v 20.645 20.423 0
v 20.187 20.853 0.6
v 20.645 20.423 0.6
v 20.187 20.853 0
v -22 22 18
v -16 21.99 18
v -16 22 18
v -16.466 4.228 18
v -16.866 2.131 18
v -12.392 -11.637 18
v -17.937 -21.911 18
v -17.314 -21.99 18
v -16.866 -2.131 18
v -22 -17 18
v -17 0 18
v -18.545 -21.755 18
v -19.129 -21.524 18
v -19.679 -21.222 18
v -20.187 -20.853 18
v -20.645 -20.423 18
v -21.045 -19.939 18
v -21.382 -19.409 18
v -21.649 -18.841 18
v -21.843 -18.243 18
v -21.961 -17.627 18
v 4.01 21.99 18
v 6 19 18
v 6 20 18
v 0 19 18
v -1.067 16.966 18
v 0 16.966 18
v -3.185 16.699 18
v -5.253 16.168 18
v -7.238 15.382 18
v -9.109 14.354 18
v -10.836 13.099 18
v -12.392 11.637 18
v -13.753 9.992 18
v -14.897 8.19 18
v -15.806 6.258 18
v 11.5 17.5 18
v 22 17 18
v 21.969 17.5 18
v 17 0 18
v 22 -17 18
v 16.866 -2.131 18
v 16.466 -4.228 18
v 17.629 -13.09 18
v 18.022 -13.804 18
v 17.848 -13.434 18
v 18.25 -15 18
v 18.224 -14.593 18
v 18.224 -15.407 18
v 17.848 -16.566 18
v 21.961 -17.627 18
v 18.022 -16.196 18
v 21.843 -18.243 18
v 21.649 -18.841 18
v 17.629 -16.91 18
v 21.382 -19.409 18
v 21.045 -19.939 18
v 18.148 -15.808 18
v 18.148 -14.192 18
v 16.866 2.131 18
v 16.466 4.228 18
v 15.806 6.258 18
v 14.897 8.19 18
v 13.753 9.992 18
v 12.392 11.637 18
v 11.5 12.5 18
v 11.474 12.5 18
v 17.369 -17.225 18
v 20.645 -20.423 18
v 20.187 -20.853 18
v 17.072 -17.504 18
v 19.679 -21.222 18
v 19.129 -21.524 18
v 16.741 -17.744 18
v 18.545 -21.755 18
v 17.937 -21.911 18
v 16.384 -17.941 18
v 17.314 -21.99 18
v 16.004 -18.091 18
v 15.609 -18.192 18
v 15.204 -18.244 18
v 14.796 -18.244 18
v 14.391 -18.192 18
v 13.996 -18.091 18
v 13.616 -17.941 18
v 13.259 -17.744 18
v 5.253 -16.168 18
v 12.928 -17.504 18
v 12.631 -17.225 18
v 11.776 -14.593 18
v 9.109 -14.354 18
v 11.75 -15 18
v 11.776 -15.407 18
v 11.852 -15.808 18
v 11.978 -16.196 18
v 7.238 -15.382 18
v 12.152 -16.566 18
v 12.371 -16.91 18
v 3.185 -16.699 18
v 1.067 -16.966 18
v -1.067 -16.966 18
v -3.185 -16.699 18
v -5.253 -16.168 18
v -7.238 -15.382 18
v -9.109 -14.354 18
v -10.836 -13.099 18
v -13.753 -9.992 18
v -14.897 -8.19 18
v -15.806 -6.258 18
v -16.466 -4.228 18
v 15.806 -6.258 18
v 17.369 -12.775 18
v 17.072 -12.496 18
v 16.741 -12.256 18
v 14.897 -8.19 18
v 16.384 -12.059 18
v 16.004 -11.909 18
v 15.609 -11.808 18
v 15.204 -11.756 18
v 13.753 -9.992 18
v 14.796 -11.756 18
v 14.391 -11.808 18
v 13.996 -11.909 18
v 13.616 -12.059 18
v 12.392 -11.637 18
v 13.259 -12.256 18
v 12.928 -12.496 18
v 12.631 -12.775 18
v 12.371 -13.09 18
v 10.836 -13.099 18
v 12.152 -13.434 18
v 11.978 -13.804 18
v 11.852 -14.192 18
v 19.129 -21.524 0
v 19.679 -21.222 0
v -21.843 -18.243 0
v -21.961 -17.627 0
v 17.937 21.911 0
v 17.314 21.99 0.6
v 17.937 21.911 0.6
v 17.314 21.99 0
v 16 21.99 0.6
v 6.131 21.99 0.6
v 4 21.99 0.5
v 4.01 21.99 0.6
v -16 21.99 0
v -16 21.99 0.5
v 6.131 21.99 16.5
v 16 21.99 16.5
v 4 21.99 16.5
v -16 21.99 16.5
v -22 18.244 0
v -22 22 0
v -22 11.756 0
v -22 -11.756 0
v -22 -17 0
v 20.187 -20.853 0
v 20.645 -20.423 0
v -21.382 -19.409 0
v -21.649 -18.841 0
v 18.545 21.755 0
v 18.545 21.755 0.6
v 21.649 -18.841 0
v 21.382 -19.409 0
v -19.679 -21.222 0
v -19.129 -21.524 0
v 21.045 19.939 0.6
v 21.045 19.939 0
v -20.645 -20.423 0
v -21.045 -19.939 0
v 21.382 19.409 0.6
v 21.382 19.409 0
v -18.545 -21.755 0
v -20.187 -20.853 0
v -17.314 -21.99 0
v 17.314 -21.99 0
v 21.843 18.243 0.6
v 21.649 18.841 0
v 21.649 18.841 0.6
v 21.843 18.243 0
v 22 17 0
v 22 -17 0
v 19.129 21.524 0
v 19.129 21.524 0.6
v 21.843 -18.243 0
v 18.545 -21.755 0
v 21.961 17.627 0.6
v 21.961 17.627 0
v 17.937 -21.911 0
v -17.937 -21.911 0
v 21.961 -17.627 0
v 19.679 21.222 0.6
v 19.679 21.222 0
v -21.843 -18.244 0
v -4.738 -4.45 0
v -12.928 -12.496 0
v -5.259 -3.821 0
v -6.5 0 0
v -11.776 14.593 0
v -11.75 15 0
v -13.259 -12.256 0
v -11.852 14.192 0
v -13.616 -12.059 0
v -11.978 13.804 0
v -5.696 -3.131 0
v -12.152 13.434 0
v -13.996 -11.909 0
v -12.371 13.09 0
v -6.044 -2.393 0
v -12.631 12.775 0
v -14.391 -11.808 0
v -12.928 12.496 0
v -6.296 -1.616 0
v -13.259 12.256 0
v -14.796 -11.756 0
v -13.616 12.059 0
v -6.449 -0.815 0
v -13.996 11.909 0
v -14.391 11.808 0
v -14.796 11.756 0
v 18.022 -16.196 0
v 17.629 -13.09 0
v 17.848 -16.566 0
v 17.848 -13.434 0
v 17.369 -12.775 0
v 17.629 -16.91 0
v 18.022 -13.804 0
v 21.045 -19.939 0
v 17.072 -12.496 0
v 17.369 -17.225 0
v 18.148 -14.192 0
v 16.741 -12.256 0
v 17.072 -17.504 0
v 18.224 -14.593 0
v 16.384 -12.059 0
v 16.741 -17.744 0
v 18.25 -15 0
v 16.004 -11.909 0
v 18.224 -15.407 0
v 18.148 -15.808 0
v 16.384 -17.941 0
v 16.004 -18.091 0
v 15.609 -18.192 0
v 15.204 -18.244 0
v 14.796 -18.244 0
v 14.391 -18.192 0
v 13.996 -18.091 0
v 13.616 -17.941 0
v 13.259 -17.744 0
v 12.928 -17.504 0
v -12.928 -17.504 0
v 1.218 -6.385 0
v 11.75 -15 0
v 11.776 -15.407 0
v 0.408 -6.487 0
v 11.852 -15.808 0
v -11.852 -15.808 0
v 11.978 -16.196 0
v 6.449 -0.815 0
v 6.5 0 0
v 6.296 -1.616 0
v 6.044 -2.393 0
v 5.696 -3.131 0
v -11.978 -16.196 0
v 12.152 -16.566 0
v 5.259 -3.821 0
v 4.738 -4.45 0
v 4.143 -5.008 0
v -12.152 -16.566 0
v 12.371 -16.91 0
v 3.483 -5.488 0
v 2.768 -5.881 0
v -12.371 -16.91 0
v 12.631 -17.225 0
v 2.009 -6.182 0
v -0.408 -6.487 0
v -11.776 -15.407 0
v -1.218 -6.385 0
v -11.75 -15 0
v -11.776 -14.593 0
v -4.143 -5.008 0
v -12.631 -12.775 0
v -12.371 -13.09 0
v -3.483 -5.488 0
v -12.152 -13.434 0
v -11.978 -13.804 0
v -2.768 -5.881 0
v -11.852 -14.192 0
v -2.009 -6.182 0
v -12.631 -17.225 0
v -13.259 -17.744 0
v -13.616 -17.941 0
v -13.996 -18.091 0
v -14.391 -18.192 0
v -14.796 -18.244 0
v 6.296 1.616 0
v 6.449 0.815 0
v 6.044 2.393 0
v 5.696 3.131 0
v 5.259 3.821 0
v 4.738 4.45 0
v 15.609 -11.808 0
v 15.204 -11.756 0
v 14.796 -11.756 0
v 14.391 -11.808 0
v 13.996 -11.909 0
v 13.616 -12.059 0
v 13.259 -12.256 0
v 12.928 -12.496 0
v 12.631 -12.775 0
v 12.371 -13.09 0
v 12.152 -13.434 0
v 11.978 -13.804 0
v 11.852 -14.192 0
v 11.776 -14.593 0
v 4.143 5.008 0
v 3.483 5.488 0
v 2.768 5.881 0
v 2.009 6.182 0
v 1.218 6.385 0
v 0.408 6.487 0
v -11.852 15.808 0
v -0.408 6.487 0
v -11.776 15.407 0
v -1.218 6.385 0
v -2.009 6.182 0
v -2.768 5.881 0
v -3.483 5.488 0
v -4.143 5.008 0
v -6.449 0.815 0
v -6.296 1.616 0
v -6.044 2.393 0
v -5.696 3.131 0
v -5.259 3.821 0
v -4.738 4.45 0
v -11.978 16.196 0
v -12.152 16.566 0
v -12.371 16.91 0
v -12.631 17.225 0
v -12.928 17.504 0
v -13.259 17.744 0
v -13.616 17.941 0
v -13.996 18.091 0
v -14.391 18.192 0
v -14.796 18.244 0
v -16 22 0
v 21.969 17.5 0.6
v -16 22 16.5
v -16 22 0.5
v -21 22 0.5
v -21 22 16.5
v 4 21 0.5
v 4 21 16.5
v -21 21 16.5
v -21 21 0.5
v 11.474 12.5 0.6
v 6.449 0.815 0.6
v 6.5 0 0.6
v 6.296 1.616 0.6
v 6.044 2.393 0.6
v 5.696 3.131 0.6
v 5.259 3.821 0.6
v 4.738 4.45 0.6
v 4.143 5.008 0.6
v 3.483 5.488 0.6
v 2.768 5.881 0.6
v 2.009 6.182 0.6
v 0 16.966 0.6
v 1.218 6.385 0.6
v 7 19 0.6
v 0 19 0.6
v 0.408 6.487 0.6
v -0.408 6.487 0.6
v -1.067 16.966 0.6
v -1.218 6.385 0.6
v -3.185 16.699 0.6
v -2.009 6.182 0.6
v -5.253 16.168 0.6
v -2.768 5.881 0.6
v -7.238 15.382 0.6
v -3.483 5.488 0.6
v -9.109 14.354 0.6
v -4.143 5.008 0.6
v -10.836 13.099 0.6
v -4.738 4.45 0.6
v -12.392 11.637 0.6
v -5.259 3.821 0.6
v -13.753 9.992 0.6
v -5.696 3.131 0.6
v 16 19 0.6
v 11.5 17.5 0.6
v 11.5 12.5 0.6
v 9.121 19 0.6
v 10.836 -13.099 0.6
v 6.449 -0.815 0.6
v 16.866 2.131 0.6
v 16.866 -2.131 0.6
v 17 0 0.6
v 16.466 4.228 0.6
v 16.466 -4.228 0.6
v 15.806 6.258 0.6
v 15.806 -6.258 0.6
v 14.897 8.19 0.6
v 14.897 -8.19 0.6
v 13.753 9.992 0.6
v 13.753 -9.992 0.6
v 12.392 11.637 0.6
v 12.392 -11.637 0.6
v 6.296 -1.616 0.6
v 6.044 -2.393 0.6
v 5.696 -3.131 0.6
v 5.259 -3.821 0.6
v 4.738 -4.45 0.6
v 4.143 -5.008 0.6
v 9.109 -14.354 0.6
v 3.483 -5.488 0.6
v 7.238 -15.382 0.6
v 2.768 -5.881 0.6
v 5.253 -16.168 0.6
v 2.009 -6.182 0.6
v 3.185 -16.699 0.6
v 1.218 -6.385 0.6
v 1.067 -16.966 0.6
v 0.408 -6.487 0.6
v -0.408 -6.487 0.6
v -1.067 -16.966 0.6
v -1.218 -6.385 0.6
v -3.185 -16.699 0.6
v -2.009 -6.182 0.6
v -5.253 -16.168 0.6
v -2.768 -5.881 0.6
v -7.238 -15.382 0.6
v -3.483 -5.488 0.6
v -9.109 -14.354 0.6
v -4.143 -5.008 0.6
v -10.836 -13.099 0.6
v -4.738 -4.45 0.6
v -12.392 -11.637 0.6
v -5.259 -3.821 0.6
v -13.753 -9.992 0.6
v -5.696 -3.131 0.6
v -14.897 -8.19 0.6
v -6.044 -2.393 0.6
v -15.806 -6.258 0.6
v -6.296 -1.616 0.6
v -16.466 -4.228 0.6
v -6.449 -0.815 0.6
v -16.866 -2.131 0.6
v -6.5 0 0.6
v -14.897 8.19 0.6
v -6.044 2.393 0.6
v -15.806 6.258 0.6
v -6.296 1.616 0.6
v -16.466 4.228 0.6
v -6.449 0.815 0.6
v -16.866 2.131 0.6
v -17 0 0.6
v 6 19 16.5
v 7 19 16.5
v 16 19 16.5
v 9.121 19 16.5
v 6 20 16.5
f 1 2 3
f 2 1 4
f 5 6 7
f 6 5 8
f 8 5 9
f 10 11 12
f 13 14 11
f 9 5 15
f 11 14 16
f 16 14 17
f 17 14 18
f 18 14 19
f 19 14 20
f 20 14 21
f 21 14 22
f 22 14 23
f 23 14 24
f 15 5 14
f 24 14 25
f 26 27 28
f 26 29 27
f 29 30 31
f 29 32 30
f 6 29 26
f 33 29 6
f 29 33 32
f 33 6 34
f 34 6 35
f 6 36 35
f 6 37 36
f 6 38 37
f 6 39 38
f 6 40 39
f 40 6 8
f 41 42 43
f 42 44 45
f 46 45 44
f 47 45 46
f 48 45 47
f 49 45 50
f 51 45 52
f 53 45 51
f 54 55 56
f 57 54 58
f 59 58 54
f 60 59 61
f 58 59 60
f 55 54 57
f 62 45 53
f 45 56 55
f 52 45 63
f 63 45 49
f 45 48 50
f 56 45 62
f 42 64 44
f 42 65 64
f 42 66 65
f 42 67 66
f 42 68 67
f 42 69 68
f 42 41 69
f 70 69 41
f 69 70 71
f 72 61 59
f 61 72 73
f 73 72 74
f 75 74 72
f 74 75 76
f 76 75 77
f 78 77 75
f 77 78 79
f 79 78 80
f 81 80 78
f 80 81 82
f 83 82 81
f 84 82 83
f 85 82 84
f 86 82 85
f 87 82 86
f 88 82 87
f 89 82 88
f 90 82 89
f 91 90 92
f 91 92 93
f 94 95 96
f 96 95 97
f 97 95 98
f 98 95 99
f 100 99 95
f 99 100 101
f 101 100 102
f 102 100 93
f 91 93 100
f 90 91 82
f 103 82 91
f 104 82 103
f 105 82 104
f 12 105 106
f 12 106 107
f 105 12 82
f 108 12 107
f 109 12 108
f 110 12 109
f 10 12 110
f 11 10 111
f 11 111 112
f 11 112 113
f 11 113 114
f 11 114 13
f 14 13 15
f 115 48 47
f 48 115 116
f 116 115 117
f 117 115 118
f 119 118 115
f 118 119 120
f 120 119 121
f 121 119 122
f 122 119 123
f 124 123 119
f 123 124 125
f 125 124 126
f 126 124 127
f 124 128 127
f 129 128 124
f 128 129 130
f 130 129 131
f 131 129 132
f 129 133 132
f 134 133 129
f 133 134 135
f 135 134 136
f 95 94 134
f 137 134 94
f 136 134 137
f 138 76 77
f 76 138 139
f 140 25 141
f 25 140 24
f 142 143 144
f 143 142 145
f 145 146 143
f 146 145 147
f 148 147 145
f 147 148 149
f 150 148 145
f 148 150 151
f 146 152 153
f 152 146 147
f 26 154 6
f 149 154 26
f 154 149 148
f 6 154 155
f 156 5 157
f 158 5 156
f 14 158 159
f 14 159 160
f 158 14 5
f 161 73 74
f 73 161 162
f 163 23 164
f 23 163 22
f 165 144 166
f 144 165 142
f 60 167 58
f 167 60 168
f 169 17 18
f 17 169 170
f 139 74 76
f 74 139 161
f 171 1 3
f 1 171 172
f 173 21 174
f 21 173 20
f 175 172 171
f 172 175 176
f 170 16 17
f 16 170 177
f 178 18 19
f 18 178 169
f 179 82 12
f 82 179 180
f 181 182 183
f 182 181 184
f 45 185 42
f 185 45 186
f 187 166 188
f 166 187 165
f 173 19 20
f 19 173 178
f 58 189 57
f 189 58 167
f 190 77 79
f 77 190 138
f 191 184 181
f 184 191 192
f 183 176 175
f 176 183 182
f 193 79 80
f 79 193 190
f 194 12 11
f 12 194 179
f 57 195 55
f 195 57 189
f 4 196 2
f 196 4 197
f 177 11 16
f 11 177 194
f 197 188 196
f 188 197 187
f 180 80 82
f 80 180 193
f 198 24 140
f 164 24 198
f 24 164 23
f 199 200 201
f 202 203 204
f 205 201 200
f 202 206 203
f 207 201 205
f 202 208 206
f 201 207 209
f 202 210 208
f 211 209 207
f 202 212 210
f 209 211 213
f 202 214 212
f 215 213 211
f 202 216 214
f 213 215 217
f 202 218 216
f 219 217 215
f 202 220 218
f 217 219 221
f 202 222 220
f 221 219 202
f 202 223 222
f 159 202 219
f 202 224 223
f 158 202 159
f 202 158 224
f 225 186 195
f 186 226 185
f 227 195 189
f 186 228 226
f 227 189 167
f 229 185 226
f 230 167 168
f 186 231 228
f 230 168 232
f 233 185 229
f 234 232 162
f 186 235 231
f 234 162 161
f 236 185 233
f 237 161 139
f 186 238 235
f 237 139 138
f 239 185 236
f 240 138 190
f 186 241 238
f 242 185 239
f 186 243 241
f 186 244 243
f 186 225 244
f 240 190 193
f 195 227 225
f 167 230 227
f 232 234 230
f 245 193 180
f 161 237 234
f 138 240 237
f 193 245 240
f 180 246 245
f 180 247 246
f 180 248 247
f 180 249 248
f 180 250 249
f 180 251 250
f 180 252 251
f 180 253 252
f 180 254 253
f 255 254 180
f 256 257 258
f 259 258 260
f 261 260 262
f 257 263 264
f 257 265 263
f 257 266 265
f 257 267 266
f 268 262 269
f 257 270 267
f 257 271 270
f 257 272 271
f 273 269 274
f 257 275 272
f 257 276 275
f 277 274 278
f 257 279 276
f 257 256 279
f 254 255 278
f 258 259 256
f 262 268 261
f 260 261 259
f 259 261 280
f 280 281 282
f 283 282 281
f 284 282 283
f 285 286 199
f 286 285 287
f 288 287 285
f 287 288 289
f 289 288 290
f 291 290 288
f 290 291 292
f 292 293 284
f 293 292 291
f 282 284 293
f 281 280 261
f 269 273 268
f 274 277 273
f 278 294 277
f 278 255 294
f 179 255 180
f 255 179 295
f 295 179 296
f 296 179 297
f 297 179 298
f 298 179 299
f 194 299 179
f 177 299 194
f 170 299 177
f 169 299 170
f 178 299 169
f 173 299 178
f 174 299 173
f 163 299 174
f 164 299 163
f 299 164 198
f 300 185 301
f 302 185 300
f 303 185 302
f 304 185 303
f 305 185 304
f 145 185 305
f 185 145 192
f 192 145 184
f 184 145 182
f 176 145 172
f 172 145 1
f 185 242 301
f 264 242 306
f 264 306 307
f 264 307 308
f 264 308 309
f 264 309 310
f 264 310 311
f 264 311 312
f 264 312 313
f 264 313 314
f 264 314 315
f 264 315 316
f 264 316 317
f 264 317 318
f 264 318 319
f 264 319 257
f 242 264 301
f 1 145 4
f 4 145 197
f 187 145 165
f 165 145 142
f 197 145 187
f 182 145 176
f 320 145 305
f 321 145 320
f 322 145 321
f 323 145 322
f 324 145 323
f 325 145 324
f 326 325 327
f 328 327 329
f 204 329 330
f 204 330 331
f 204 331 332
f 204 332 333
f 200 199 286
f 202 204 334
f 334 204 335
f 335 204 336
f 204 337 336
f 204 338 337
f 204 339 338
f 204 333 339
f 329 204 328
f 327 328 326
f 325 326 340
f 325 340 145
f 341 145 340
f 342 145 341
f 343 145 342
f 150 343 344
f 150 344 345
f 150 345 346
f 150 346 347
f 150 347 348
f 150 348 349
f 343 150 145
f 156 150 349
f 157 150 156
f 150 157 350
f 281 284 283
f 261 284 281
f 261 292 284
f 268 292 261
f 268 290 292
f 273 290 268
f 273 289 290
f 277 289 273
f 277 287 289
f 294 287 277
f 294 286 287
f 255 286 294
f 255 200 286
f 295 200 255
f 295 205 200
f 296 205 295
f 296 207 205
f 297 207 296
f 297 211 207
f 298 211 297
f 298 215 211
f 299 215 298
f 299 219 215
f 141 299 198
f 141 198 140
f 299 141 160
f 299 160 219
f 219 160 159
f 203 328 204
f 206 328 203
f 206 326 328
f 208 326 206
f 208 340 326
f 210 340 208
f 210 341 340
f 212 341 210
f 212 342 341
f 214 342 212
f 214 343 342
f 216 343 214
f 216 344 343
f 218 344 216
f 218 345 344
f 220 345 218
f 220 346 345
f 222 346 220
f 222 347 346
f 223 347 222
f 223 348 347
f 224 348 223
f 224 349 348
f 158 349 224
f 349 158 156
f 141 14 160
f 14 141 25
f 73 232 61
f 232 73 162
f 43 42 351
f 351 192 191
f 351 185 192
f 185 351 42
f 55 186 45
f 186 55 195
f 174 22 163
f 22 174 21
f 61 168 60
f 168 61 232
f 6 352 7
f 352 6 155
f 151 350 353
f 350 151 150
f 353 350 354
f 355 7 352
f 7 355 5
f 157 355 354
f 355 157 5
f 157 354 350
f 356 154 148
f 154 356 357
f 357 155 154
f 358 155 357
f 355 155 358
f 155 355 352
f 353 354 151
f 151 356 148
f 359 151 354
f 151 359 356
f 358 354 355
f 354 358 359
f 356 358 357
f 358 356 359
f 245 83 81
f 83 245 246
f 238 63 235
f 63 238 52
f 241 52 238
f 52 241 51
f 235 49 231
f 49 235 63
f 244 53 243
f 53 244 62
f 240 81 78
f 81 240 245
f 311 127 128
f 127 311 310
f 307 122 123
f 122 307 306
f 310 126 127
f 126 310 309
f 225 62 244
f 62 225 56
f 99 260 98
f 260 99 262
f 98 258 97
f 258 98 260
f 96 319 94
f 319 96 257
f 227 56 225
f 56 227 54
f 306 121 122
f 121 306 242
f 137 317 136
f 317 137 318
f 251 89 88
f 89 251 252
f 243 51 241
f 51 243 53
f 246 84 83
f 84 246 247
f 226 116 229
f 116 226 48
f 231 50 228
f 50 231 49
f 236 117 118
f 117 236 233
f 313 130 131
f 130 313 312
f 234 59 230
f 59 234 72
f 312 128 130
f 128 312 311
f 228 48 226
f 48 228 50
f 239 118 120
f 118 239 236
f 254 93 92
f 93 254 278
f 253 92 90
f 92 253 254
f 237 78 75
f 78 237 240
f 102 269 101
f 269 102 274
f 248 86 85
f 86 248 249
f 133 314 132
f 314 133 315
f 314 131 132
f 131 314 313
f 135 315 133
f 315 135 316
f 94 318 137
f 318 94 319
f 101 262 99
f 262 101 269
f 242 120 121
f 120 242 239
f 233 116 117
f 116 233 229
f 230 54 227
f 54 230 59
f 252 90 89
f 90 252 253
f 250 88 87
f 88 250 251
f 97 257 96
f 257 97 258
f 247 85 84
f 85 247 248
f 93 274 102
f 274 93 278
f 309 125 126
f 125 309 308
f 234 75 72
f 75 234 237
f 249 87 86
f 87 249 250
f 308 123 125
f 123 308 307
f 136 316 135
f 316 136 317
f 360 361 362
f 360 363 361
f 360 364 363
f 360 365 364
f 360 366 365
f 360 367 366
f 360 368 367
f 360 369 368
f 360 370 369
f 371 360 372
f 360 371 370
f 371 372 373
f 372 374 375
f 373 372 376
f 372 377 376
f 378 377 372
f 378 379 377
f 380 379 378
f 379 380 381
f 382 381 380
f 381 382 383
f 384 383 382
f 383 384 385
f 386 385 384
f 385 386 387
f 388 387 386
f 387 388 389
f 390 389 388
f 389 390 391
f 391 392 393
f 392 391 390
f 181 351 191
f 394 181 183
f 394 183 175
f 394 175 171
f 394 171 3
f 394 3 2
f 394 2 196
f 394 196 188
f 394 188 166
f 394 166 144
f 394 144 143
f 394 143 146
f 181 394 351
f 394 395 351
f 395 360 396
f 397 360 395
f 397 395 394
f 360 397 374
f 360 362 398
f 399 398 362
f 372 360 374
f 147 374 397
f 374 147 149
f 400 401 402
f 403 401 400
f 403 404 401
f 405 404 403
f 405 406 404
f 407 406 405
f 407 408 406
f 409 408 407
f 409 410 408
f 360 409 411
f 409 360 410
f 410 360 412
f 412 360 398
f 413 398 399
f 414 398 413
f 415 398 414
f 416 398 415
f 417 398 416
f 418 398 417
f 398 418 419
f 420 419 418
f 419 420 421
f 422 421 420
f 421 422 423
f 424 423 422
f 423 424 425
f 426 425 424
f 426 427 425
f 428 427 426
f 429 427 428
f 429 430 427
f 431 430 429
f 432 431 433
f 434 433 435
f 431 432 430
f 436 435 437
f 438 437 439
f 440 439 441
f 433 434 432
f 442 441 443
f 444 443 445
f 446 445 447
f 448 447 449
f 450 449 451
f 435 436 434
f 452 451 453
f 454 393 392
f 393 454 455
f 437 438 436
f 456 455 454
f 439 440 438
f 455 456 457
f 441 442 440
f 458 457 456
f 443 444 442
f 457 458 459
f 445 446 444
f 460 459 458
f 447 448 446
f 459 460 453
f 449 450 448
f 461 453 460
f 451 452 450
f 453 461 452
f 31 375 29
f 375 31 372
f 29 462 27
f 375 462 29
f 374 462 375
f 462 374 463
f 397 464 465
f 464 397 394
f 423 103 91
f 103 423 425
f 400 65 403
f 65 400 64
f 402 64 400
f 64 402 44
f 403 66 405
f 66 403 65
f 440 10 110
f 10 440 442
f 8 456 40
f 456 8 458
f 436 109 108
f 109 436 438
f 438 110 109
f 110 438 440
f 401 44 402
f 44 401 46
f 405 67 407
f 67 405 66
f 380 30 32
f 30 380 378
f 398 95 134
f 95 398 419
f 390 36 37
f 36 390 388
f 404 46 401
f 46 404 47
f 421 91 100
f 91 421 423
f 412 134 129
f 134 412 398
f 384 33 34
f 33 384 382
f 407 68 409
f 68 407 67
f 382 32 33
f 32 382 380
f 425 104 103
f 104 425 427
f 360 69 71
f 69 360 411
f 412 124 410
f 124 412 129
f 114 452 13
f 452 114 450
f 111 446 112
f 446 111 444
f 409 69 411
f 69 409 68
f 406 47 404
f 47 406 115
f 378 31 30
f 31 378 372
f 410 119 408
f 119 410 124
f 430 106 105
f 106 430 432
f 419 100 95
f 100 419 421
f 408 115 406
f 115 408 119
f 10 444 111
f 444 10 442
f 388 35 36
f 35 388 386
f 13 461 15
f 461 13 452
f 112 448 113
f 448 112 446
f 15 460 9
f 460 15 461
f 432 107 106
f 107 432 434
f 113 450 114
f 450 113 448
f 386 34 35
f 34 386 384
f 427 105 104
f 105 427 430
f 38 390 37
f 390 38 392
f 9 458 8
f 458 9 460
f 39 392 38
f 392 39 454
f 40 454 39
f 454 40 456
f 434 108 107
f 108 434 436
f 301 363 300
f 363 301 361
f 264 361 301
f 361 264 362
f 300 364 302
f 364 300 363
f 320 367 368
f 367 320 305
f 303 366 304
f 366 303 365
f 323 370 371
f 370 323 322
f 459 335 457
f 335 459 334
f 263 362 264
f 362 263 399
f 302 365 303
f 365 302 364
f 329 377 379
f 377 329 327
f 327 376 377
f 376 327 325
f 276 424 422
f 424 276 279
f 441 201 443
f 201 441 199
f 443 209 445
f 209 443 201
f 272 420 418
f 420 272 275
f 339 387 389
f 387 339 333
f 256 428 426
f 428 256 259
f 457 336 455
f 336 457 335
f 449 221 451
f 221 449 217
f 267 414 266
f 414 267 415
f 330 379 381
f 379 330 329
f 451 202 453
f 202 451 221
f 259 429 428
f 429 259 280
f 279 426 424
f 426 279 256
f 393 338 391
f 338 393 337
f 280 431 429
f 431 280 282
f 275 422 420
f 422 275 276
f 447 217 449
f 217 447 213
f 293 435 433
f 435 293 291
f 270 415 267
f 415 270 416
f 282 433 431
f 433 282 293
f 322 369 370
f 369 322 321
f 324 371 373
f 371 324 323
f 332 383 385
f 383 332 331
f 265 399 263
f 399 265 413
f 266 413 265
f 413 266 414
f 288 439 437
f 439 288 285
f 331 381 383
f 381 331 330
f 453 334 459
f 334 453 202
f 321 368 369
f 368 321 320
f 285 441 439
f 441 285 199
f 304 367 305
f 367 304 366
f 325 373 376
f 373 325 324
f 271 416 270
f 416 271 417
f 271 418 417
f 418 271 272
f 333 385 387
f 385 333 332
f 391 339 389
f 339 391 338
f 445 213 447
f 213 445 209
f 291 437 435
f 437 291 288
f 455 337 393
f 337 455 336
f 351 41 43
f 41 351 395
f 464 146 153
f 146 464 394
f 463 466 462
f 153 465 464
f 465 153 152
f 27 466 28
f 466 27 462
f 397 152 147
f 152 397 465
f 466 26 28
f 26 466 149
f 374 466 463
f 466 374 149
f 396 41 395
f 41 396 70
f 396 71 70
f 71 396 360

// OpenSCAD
$fn = 50;


difference() {
	union() {
		hull() {
			translate(v = [-17.0000000000, 17.0000000000, 0]) {
				cylinder(h = 18, r = 5);
			}
			translate(v = [17.0000000000, 17.0000000000, 0]) {
				cylinder(h = 18, r = 5);
			}
			translate(v = [-17.0000000000, -17.0000000000, 0]) {
				cylinder(h = 18, r = 5);
			}
			translate(v = [17.0000000000, -17.0000000000, 0]) {
				cylinder(h = 18, r = 5);
			}
		}
		translate(v = [-22.0000000000, 16.0000000000, 0]) {
			cube(size = [6, 6, 18]);
		}
	}
	union() {
		translate(v = [-22.5000000000, -15.0000000000, -250.0000000000]) {
			rotate(a = [0, 0, 0]) {
				difference() {
					union() {
						hull() {
							translate(v = [7.5000000000, 0, 0]) {
								cylinder(h = 250, r = 3.2500000000, r1 = 3.2500000000, r2 = 3.2500000000);
							}
							translate(v = [-7.5000000000, 0, 0]) {
								cylinder(h = 250, r = 3.2500000000, r1 = 3.2500000000, r2 = 3.2500000000);
							}
						}
					}
					union();
				}
			}
		}
		translate(v = [-22.5000000000, 15.0000000000, -250.0000000000]) {
			rotate(a = [0, 0, 0]) {
				difference() {
					union() {
						hull() {
							translate(v = [7.5000000000, 0, 0]) {
								cylinder(h = 250, r = 3.2500000000, r1 = 3.2500000000, r2 = 3.2500000000);
							}
							translate(v = [-7.5000000000, 0, 0]) {
								cylinder(h = 250, r = 3.2500000000, r1 = 3.2500000000, r2 = 3.2500000000);
							}
						}
					}
					union();
				}
			}
		}
		translate(v = [-21.0000000000, 21.0000000000, 0.5000000000]) {
			cube(size = [25, 1, 16]);
		}
		translate(v = [15.0000000000, -15.0000000000, -50.0000000000]) {
			cylinder(h = 100, r = 3.2500000000);
		}
		translate(v = [0.0000000000, 11.0000000000, 0.6000000000]) {
			cube(size = [11, 8, 20.4000000000]);
		}
		translate(v = [0, 0, 0.6000000000]) {
			cylinder(h = 20.4000000000, r = 17.0000000000);
		}
		translate(v = [0, 0, -9.0000000000]) {
			cylinder(h = 18, r = 6.5000000000);
		}
		translate(v = [0.0000000000, 17.5000000000, 0.6000000000]) {
			cube(size = [22.0000000000, 1.5000000000, 20.4000000000]);
		}
		translate(v = [16.0000000000, 17.5000000000, 0.6000000000]) {
			cube(size = [6, 4.5000000000, 20.4000000000]);
		}
		translate(v = [6.0000000000, 17.5000000000, 16.5000000000]) {
			cube(size = [16, 4.5000000000, 1.5000000000]);
		}
		translate(v = [3.2500000000, 22.7500000000, 0.6000000000]) {
			rotate(a = [0, 0, -45]) {
				cube(size = [7.5000000000, 1.5000000000, 20.4000000000]);
			}
		}
		translate(v = [2.5000000000, 12.5000000000, 0.6000000000]) {
			cube(size = [9.0000000000, 5, 17.4000000000]);
		}
	}
}
